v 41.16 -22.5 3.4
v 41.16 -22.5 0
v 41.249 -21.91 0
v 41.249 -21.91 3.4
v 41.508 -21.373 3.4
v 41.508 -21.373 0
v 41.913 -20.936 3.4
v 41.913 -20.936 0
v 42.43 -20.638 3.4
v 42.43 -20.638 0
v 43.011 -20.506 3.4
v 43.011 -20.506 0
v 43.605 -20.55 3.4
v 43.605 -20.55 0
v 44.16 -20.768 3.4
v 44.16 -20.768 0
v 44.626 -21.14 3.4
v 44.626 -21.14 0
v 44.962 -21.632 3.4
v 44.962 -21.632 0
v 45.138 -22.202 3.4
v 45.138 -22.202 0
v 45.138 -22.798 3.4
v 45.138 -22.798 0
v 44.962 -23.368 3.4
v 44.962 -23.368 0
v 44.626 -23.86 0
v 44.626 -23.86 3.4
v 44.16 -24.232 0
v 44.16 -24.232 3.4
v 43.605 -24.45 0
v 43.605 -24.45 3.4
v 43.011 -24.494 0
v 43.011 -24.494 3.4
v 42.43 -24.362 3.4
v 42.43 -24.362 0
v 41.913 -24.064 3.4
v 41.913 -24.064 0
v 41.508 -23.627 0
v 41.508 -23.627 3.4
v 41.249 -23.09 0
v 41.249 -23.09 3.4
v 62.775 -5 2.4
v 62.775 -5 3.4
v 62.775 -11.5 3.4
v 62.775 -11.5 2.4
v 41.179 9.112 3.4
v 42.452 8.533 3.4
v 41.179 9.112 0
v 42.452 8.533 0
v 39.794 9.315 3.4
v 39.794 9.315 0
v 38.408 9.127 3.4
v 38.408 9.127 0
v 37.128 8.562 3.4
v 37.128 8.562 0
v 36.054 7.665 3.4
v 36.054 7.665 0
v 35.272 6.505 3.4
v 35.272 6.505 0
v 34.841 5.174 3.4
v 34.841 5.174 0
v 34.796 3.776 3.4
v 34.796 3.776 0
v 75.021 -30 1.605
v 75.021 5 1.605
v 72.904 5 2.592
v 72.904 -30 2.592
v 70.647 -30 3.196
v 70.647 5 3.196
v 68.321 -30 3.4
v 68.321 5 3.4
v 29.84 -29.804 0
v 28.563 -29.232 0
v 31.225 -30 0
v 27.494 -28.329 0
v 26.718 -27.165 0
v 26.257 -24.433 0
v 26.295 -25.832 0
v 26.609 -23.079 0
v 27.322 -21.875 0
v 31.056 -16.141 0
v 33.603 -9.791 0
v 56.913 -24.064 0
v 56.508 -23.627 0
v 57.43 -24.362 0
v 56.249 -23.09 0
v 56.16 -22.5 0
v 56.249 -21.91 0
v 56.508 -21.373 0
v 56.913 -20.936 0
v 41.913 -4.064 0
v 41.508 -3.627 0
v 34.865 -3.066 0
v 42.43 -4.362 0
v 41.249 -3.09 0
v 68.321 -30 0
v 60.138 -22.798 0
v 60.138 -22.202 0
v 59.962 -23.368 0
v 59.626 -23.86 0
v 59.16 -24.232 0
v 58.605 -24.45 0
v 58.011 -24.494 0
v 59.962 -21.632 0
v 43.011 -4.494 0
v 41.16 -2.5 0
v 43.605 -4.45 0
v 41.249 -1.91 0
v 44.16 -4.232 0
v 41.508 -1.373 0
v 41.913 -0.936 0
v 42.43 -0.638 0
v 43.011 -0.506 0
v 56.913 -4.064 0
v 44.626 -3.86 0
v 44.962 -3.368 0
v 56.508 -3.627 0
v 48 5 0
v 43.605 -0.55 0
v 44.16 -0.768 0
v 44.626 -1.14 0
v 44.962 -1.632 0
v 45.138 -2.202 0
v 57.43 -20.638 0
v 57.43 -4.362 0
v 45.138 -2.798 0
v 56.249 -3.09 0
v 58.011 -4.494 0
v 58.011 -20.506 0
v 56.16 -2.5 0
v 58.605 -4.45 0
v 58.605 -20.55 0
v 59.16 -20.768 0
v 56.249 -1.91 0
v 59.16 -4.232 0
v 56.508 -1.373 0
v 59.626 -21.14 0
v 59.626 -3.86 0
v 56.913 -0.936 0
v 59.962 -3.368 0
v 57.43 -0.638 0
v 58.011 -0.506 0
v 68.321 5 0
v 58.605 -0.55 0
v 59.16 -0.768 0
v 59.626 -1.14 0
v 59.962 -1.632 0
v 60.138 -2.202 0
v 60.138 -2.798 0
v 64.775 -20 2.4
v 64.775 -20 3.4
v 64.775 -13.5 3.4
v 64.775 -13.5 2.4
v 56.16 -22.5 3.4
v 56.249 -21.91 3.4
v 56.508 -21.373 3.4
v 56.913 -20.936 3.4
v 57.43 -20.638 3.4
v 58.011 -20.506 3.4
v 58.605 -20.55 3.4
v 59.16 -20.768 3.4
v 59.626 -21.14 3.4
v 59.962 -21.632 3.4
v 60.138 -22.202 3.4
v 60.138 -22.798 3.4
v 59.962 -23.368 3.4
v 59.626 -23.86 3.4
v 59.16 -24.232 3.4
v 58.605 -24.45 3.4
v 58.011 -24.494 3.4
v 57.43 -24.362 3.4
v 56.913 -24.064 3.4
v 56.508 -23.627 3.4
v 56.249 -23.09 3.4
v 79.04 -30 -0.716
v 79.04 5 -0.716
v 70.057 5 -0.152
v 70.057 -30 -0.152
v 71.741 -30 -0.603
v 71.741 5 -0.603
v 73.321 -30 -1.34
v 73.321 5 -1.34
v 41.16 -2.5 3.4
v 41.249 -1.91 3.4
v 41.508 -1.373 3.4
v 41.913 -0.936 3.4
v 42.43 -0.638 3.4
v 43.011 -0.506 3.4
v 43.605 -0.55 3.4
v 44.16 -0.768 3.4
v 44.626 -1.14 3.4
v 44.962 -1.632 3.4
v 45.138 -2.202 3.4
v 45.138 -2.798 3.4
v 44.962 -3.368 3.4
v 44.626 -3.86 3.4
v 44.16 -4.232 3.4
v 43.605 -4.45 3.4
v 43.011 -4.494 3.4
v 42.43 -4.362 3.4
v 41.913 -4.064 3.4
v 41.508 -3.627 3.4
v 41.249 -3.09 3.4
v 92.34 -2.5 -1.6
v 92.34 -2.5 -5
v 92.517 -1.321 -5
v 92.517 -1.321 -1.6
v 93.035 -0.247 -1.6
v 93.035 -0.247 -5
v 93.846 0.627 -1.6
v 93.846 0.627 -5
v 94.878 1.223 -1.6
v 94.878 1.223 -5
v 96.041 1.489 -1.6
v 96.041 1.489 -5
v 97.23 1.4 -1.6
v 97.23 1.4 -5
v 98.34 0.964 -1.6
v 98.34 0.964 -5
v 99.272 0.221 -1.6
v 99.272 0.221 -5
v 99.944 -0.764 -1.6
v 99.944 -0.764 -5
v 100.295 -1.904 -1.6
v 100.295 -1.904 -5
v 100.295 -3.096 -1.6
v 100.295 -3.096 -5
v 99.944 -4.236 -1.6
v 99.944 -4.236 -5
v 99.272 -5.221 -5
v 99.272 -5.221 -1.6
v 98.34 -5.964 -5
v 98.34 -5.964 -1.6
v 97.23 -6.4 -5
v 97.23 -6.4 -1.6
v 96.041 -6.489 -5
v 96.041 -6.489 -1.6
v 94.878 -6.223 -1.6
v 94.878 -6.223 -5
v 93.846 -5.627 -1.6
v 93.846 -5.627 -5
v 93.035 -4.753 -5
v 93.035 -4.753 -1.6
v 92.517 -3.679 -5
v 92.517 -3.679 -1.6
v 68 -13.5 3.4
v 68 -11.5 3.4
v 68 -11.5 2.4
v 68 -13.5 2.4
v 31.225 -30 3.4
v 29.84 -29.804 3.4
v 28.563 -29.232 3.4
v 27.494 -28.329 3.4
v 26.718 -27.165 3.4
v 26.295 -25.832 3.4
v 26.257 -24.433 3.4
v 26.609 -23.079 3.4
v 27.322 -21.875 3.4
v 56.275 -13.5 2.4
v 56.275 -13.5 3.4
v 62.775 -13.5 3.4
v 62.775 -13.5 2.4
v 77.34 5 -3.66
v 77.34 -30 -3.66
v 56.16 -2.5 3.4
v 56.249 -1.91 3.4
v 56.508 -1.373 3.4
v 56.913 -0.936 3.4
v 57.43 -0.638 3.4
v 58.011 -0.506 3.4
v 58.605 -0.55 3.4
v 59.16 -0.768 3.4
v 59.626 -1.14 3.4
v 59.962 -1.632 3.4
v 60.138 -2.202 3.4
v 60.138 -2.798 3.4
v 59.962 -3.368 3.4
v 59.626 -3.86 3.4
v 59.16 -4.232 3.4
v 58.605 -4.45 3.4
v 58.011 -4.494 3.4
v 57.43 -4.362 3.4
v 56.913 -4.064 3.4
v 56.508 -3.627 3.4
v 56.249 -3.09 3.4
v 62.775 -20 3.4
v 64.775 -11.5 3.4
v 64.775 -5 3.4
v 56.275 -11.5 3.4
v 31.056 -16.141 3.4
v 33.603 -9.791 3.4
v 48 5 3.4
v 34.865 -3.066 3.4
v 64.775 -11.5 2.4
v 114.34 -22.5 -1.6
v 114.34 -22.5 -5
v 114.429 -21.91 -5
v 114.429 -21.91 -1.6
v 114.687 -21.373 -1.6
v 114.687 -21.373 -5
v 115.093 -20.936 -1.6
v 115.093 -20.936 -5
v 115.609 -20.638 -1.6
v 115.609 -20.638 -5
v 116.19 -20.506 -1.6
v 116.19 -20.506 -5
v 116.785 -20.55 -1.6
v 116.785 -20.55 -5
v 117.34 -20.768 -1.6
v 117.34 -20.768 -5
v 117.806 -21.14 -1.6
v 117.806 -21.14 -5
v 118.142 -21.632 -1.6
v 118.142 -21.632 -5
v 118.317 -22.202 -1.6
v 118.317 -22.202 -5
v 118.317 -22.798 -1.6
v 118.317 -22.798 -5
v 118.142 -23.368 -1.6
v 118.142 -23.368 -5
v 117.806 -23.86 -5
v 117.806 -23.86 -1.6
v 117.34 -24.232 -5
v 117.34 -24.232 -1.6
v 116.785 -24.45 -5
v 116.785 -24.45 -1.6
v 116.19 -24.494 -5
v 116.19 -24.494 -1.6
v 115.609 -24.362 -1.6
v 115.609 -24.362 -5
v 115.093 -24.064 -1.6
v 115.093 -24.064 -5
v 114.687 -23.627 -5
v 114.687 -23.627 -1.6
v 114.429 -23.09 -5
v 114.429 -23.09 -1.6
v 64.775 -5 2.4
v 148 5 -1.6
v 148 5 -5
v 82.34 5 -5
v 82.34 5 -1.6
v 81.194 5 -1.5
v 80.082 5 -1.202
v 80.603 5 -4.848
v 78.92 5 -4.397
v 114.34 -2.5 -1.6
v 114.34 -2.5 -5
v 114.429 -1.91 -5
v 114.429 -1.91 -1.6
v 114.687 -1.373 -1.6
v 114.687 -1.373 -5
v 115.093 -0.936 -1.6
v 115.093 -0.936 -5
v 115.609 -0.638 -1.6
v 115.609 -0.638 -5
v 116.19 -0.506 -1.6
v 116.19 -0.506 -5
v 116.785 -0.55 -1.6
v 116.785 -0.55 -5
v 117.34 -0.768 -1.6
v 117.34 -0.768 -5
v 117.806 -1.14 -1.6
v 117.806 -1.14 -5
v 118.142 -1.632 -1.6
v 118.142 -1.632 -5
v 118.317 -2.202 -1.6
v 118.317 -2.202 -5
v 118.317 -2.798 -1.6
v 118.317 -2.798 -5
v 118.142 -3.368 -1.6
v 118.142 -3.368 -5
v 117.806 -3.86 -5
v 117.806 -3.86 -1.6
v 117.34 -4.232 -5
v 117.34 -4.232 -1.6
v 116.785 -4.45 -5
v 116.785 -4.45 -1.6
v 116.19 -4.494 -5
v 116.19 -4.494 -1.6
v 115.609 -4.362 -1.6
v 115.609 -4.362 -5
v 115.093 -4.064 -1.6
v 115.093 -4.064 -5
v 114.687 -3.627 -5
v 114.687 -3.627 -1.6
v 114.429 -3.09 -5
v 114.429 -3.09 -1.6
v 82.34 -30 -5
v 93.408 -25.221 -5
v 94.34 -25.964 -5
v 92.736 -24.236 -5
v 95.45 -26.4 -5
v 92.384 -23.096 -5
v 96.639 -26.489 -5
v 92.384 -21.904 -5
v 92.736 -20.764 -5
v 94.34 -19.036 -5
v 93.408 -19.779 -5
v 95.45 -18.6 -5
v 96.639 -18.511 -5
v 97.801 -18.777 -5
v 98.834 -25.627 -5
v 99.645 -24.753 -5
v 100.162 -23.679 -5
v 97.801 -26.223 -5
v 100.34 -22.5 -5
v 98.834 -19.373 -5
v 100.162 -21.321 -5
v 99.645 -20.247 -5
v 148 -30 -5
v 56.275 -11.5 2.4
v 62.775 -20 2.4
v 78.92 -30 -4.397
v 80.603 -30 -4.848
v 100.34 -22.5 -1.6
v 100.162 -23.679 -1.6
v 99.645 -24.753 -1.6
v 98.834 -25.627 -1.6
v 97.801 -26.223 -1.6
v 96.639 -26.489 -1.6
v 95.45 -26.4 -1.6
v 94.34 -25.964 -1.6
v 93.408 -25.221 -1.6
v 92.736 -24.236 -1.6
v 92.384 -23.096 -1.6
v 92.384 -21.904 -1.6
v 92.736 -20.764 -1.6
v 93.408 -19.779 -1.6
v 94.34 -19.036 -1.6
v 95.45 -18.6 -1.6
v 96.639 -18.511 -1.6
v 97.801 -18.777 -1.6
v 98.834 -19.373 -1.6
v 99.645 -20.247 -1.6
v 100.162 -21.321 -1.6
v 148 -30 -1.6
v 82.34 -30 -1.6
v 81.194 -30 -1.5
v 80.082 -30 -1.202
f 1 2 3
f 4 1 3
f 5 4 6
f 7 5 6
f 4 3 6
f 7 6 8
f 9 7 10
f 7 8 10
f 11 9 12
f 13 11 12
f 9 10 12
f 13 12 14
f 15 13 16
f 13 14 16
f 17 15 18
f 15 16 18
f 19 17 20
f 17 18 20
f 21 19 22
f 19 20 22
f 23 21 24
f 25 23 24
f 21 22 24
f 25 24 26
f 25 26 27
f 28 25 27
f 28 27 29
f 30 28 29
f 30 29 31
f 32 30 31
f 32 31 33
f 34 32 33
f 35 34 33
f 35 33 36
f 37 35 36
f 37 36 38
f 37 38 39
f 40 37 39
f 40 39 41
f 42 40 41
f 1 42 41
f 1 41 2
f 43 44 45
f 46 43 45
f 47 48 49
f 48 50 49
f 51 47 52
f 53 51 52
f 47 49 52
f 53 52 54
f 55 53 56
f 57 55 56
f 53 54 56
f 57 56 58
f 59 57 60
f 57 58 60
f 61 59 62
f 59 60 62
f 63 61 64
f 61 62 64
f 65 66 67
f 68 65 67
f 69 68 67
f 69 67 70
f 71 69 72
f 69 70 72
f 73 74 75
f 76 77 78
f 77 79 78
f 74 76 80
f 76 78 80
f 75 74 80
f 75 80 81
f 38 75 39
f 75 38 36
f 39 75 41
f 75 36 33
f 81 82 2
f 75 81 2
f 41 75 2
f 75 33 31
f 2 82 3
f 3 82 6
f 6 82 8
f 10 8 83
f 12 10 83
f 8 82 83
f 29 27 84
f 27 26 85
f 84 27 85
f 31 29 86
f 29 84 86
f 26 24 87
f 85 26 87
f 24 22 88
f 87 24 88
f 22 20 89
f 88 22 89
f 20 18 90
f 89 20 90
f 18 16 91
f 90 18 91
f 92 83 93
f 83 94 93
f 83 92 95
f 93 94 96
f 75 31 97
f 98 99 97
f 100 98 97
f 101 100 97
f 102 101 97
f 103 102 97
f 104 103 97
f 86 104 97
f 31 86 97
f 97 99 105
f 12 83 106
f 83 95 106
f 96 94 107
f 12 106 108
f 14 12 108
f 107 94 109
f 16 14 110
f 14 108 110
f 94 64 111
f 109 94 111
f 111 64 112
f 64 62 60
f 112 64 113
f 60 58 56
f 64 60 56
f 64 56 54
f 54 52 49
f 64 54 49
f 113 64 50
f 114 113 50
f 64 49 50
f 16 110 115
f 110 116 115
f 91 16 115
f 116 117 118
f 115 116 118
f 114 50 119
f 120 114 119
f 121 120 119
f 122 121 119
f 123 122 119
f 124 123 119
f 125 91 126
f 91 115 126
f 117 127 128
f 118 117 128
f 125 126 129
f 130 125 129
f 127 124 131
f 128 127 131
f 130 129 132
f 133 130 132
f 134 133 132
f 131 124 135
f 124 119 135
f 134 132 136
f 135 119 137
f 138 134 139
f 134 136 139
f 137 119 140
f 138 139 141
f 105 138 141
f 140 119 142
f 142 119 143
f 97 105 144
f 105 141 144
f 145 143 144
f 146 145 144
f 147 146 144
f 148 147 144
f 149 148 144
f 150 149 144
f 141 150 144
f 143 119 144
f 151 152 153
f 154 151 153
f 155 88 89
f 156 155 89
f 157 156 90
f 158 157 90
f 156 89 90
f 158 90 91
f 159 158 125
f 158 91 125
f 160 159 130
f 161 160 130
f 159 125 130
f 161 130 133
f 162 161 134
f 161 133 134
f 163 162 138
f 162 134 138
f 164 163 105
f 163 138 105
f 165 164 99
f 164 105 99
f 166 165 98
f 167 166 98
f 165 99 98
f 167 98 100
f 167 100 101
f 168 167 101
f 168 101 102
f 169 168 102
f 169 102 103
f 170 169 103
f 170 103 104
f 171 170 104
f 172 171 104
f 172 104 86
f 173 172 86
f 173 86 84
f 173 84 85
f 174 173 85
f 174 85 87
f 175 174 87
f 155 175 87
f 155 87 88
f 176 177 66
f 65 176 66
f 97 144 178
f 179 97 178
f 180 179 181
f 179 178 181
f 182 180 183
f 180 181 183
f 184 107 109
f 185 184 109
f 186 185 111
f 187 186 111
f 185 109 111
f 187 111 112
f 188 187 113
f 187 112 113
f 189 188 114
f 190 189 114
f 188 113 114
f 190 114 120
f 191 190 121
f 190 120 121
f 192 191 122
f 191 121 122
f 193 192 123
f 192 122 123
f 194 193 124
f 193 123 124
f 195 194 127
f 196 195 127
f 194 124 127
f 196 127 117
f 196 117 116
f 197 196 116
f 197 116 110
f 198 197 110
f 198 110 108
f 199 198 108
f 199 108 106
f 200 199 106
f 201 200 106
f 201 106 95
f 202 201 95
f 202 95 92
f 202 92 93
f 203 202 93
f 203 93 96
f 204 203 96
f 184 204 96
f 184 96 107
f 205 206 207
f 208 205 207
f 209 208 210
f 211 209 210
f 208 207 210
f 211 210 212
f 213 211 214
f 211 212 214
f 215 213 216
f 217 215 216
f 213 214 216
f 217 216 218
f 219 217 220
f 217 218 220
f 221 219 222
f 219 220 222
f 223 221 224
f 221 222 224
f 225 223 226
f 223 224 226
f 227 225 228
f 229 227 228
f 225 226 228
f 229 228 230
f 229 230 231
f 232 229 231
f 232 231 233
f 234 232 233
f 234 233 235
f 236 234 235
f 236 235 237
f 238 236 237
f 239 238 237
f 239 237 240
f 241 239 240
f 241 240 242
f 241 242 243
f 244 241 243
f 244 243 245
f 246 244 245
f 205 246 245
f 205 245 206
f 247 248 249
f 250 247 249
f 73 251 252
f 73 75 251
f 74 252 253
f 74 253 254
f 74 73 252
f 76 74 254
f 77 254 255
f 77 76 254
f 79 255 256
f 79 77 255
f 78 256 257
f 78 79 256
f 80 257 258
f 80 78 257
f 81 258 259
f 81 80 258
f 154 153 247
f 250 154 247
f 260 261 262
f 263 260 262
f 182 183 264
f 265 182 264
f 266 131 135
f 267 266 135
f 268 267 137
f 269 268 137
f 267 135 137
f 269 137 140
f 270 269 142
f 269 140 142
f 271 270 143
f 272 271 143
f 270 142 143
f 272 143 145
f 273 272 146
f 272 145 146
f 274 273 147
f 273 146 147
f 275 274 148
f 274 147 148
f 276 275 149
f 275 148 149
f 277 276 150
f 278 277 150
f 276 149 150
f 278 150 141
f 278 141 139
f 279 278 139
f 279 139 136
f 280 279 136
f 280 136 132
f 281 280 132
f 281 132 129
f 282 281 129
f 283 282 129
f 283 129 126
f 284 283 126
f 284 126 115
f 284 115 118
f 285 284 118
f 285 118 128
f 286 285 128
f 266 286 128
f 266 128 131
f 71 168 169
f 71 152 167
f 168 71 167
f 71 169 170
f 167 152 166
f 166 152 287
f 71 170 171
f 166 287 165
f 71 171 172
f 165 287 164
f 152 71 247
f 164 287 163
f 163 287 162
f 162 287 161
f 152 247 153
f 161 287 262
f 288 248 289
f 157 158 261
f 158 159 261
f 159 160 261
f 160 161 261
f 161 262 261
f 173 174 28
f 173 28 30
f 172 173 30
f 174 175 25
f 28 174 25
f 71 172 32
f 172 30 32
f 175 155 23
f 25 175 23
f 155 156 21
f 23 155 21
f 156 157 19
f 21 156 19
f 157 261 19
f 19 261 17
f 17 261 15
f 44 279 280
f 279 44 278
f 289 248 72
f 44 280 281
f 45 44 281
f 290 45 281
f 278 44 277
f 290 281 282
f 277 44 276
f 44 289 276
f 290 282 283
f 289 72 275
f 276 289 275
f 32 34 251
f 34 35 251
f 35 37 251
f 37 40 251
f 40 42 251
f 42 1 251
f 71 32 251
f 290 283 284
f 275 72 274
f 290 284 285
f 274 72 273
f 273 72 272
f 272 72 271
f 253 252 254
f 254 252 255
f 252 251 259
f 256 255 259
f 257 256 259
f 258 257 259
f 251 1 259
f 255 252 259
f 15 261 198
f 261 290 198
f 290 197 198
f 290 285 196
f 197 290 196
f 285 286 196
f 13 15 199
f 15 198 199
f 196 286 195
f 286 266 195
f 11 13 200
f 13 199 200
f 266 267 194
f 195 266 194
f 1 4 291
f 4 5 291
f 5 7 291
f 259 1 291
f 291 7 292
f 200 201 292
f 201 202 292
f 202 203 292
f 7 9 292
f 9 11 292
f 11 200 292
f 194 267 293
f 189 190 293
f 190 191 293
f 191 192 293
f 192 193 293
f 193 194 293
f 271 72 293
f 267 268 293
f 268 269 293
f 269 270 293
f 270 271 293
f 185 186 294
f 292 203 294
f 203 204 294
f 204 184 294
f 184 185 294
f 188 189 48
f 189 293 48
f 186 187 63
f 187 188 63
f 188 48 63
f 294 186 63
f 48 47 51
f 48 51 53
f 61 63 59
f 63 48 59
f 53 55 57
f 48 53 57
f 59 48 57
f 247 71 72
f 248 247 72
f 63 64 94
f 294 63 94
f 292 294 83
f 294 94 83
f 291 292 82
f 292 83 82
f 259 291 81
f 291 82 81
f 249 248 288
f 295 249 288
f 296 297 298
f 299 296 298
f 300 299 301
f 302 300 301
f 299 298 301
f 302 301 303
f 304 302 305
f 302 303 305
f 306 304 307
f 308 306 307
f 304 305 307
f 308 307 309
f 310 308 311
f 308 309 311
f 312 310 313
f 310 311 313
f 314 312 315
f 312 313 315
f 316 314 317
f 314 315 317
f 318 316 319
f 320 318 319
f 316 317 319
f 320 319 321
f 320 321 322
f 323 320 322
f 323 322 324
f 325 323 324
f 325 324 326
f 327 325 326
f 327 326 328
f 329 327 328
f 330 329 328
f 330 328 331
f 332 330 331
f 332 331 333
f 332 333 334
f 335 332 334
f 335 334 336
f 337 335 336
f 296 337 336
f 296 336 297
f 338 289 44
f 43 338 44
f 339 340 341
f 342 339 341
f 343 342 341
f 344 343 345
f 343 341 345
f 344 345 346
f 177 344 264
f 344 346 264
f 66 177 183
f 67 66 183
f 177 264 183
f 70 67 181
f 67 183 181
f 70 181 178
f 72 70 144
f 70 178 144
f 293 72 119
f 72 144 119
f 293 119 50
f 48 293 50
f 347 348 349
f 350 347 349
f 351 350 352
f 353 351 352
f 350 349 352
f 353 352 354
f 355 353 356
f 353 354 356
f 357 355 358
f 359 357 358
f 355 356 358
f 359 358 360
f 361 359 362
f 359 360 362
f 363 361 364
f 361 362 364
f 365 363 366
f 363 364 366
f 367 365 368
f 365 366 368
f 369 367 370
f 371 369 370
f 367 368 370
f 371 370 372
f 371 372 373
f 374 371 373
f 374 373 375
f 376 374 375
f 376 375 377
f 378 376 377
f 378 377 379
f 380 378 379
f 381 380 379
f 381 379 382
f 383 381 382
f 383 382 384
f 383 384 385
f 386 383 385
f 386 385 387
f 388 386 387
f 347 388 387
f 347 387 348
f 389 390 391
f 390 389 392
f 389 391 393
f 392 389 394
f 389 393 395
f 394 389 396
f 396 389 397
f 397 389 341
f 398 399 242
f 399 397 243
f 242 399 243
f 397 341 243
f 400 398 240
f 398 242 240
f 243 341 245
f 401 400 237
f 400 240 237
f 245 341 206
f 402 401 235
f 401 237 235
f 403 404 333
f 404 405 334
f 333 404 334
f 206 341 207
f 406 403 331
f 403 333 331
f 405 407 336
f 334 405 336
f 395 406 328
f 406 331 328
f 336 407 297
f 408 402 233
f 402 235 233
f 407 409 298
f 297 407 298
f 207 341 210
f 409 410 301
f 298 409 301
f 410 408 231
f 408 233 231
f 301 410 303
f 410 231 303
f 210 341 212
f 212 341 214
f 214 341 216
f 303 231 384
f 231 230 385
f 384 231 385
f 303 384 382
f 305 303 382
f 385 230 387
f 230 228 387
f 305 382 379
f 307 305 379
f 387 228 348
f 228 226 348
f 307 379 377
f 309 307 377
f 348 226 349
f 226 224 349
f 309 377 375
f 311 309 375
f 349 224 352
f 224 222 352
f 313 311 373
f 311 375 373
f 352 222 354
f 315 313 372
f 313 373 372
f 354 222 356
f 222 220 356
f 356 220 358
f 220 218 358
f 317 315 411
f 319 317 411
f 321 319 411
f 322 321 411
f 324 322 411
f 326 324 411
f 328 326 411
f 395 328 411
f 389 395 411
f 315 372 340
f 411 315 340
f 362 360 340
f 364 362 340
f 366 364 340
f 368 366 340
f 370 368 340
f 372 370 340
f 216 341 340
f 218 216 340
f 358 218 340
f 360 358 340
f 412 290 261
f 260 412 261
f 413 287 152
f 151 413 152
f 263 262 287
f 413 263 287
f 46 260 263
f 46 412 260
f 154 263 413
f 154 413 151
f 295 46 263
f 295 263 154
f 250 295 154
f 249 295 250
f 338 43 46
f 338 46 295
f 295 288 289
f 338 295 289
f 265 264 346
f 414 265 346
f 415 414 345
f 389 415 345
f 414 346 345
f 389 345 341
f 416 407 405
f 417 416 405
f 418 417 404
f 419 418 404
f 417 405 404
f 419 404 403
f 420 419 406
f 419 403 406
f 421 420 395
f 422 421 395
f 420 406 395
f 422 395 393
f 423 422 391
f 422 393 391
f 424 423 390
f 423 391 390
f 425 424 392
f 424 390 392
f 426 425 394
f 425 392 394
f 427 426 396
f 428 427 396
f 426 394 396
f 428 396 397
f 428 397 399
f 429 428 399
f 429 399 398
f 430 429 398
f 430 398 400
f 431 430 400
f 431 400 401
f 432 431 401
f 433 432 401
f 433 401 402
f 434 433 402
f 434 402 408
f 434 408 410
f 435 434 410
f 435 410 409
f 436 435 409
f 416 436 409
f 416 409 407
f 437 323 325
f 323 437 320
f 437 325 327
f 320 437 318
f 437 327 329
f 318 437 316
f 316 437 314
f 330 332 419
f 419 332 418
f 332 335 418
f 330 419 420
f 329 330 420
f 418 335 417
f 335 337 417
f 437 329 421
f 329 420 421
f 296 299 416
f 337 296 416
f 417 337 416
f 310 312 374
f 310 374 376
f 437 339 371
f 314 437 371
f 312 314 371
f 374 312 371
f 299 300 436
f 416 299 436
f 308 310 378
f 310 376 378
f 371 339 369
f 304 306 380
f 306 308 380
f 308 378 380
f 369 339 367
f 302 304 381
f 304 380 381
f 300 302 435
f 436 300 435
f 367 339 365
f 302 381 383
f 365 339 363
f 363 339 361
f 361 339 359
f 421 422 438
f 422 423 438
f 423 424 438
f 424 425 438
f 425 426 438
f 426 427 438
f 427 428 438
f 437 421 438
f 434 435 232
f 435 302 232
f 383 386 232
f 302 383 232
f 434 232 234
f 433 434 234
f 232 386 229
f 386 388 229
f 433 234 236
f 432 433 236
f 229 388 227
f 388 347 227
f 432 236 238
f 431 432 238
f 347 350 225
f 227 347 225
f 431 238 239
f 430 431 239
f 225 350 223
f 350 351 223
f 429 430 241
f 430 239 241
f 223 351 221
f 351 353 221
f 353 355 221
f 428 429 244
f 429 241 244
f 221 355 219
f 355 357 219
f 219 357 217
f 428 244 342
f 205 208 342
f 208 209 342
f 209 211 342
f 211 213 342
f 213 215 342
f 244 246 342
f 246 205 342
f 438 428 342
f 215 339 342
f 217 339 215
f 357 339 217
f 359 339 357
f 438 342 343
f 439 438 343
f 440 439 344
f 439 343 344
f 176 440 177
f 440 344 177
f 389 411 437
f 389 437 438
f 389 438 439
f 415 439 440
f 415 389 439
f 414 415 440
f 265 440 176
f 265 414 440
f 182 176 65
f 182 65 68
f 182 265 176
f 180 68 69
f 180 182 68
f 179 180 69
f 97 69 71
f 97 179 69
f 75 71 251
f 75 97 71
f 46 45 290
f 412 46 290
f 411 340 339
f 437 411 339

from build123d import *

# Parameters (mm, degrees)
BOSS_EXTRUDE1_DEPTH = 3.4
SKETCH3_R           = 5
CUT_EXTRUDE1_DEPTH  = 6
CUT_EXTRUDE2_DEPTH  = 10
SKETCH6_R           = 35
CUT_EXTRUDE3_DEPTH  = 10
CUT_EXTRUDE4_DEPTH  = 1
CUT_EXTRUDE5_REACH  = 87.508
SKETCH8_W           = 12
SKETCH8_H           = 35
BOSS_EXTRUDE2_DEPTH = 35
SKETCH10_R          = 4
CUT_EXTRUDE6_DEPTH  = 10
CUT_EXTRUDE7_REACH  = 153.093
SKETCH11_R          = 2
CUT_EXTRUDE8_REACH  = 153.243
SKETCH12_R          = 2
FILLET1_R           = 5


with BuildPart() as part:
    # Sketch1 → Boss-Extrude1 (new body)
    with BuildSketch(Plane.XY):
        with BuildLine():
            Line((0, -30), (80, -30))
            Line((80, -30), (80, 5))
            Line((80, 5), (48, 5))
            Line((48, 5), (16.114075804, 25.304872277))
            ThreePointArc((16.114075804, 25.304872277), (-28.802310396, 8.392074585), (0, -30))
        make_face()
    extrude(amount=BOSS_EXTRUDE1_DEPTH)

    # Sketch3 → Cut-Extrude1 (cut)
    with BuildSketch(Plane.XY.offset(3.4)):
        Circle(SKETCH3_R)
    extrude(amount=-CUT_EXTRUDE1_DEPTH, mode=Mode.SUBTRACT)

    # Sketch5 → Cut-Extrude2 (cut)
    with BuildSketch(Plane.XY.offset(3.4)):
        with BuildLine():
            ThreePointArc((0, 10), (-8.660254038, 5), (-8.660254038, -5))
            ThreePointArc((-8.660254038, -5), (-10.124355653, -10.464101615), (-15.588457268, -9))
            ThreePointArc((-15.588457268, -9), (-15.588457268, 9), (0, 18))
            ThreePointArc((0, 18), (4, 14), (0, 10))
        make_face()
    extrude(amount=-CUT_EXTRUDE2_DEPTH, mode=Mode.SUBTRACT)

    # Sketch6 → Cut-Extrude3 (cut)
    with BuildSketch(Plane(origin=(0, 0, 0), x_dir=(-1, 0, 0), z_dir=(0, 0, -1))):
        Circle(SKETCH6_R)
    extrude(amount=-CUT_EXTRUDE3_DEPTH, mode=Mode.SUBTRACT)

    # Sketch7 → Cut-Extrude4 (cut)
    with BuildSketch(Plane.XY.offset(3.4)):
        Polygon((62.77538264, -13.5), (62.77538264, -20), (64.77538264, -20), (64.77538264, -13.5), (71.27538264, -13.5), (71.27538264, -11.5), (64.77538264, -11.5), (64.77538264, -5), (62.77538264, -5), (62.77538264, -11.5), (56.27538264, -11.5), (56.27538264, -13.5), align=None)
    extrude(amount=-CUT_EXTRUDE4_DEPTH, mode=Mode.SUBTRACT)

    # Sketch8 → Cut-Extrude5 (cut, up to next)
    with BuildSketch(Plane(origin=(0, 0, 0), x_dir=(-1, 0, 0), z_dir=(0, 0, -1)), mode=Mode.PRIVATE) as cut_extrude5_sk1:
        with Locations((-74, -12.5)):
            Rectangle(SKETCH8_W, SKETCH8_H)
    cut_extrude5_tool1 = extrude(cut_extrude5_sk1.sketch, amount=-CUT_EXTRUDE5_REACH, mode=Mode.PRIVATE) & part.part
    add(cut_extrude5_tool1.solids().sort_by_distance((74, -12.5, 0))[0], mode=Mode.SUBTRACT)

    # Sketch9 → Boss-Extrude2 (add)
    with BuildSketch(Plane(origin=(0, 5, 0), x_dir=(1, 0, 0), z_dir=(0, 1, 0))):
        with BuildLine():
            Line((68, 0), (68.320508076, 0))
            ThreePointArc((68.320508076, 0), (70.908698527, 0.340741737), (73.320508076, 1.339745962))
            Line((73.320508076, 1.339745962), (77.339745962, 3.660254038))
            ThreePointArc((77.339745962, 3.660254038), (79.751555511, 4.659258263), (82.339745962, 5))
            Line((82.339745962, 5), (83, 5))
            Line((83, 5), (148, 5))
            Line((148, 5), (148, 1.6))
            Line((148, 1.6), (83, 1.6))
            Line((83, 1.6), (82.339745962, 1.6))
            ThreePointArc((82.339745962, 1.6), (80.631540264, 1.375110454), (79.039745962, 0.715767665))
            Line((79.039745962, 0.715767665), (75.020508076, -1.604740411))
            ThreePointArc((75.020508076, -1.604740411), (71.78868328, -2.943406072), (68.320508076, -3.4))
            Line((68.320508076, -3.4), (68, -3.4))
            Line((68, -3.4), (68, 0))
        make_face()
    extrude(amount=-BOSS_EXTRUDE2_DEPTH)

    # Sketch10 → Cut-Extrude6 (cut)
    with BuildSketch(Plane(origin=(0, 0, -5), x_dir=(-1, 0, 0), z_dir=(0, 0, -1))):
        with Locations((-96.339745962, -2.5)):
            Circle(SKETCH10_R)
        with Locations(Location((-96.339745962, -22.5, 0), (0, 0, 180))):
            Circle(SKETCH10_R)
    extrude(amount=-CUT_EXTRUDE6_DEPTH, mode=Mode.SUBTRACT)

    # Sketch11 → Cut-Extrude7 (cut, up to next)
    with BuildSketch(Plane(origin=(0, 0, 0), x_dir=(-1, 0, 0), z_dir=(0, 0, -1)), mode=Mode.PRIVATE) as cut_extrude7_sk1:
        with Locations((-58.160254038, -22.5)):
            Circle(SKETCH11_R)
    cut_extrude7_tool1 = extrude(cut_extrude7_sk1.sketch, amount=-CUT_EXTRUDE7_REACH, mode=Mode.PRIVATE) & part.part
    # Sketch11 → Cut-Extrude7 (cut, up to next)
    with BuildSketch(Plane(origin=(0, 0, 0), x_dir=(-1, 0, 0), z_dir=(0, 0, -1)), mode=Mode.PRIVATE) as cut_extrude7_sk2:
        with Locations((-58.160254038, -2.5)):
            Circle(SKETCH11_R)
    cut_extrude7_tool2 = extrude(cut_extrude7_sk2.sketch, amount=-CUT_EXTRUDE7_REACH, mode=Mode.PRIVATE) & part.part
    # Sketch11 → Cut-Extrude7 (cut, up to next)
    with BuildSketch(Plane(origin=(0, 0, 0), x_dir=(-1, 0, 0), z_dir=(0, 0, -1)), mode=Mode.PRIVATE) as cut_extrude7_sk3:
        with Locations((-43.160254038, -22.5)):
            Circle(SKETCH11_R)
    cut_extrude7_tool3 = extrude(cut_extrude7_sk3.sketch, amount=-CUT_EXTRUDE7_REACH, mode=Mode.PRIVATE) & part.part
    # Sketch11 → Cut-Extrude7 (cut, up to next)
    with BuildSketch(Plane(origin=(0, 0, 0), x_dir=(-1, 0, 0), z_dir=(0, 0, -1)), mode=Mode.PRIVATE) as cut_extrude7_sk4:
        with Locations((-43.160254038, -2.5)):
            Circle(SKETCH11_R)
    cut_extrude7_tool4 = extrude(cut_extrude7_sk4.sketch, amount=-CUT_EXTRUDE7_REACH, mode=Mode.PRIVATE) & part.part
    add(cut_extrude7_tool1.solids().sort_by_distance((58.160254, -22.5, 0))[0], mode=Mode.SUBTRACT)
    add(cut_extrude7_tool2.solids().sort_by_distance((58.160254, -2.5, 0))[0], mode=Mode.SUBTRACT)
    add(cut_extrude7_tool3.solids().sort_by_distance((43.160254, -22.5, 0))[0], mode=Mode.SUBTRACT)
    add(cut_extrude7_tool4.solids().sort_by_distance((43.160254, -2.5, 0))[0], mode=Mode.SUBTRACT)

    # Sketch12 → Cut-Extrude8 (cut, up to next)
    with BuildSketch(Plane(origin=(0, 0, -5), x_dir=(-1, 0, 0), z_dir=(0, 0, -1)), mode=Mode.PRIVATE) as cut_extrude8_sk1:
        with Locations((-116.339745962, -22.5)):
            Circle(SKETCH12_R)
    cut_extrude8_tool1 = extrude(cut_extrude8_sk1.sketch, amount=-CUT_EXTRUDE8_REACH, mode=Mode.PRIVATE) & part.part
    # Sketch12 → Cut-Extrude8 (cut, up to next)
    with BuildSketch(Plane(origin=(0, 0, -5), x_dir=(-1, 0, 0), z_dir=(0, 0, -1)), mode=Mode.PRIVATE) as cut_extrude8_sk2:
        with Locations((-116.339745962, -2.5)):
            Circle(SKETCH12_R)
    cut_extrude8_tool2 = extrude(cut_extrude8_sk2.sketch, amount=-CUT_EXTRUDE8_REACH, mode=Mode.PRIVATE) & part.part
    add(cut_extrude8_tool1.solids().sort_by_distance((116.339746, -22.5, -5))[0], mode=Mode.SUBTRACT)
    add(cut_extrude8_tool2.solids().sort_by_distance((116.339746, -2.5, -5))[0], mode=Mode.SUBTRACT)

    # Fillet1
    fillet1_edges = [part.edges().sort_by_distance(p)[0] for p in [
        (31.320411557, 15.621517849, 1.7),
        (18.027756377, -30, 1.7),
    ]]
    fillet(fillet1_edges, radius=FILLET1_R)


solid = part.part
